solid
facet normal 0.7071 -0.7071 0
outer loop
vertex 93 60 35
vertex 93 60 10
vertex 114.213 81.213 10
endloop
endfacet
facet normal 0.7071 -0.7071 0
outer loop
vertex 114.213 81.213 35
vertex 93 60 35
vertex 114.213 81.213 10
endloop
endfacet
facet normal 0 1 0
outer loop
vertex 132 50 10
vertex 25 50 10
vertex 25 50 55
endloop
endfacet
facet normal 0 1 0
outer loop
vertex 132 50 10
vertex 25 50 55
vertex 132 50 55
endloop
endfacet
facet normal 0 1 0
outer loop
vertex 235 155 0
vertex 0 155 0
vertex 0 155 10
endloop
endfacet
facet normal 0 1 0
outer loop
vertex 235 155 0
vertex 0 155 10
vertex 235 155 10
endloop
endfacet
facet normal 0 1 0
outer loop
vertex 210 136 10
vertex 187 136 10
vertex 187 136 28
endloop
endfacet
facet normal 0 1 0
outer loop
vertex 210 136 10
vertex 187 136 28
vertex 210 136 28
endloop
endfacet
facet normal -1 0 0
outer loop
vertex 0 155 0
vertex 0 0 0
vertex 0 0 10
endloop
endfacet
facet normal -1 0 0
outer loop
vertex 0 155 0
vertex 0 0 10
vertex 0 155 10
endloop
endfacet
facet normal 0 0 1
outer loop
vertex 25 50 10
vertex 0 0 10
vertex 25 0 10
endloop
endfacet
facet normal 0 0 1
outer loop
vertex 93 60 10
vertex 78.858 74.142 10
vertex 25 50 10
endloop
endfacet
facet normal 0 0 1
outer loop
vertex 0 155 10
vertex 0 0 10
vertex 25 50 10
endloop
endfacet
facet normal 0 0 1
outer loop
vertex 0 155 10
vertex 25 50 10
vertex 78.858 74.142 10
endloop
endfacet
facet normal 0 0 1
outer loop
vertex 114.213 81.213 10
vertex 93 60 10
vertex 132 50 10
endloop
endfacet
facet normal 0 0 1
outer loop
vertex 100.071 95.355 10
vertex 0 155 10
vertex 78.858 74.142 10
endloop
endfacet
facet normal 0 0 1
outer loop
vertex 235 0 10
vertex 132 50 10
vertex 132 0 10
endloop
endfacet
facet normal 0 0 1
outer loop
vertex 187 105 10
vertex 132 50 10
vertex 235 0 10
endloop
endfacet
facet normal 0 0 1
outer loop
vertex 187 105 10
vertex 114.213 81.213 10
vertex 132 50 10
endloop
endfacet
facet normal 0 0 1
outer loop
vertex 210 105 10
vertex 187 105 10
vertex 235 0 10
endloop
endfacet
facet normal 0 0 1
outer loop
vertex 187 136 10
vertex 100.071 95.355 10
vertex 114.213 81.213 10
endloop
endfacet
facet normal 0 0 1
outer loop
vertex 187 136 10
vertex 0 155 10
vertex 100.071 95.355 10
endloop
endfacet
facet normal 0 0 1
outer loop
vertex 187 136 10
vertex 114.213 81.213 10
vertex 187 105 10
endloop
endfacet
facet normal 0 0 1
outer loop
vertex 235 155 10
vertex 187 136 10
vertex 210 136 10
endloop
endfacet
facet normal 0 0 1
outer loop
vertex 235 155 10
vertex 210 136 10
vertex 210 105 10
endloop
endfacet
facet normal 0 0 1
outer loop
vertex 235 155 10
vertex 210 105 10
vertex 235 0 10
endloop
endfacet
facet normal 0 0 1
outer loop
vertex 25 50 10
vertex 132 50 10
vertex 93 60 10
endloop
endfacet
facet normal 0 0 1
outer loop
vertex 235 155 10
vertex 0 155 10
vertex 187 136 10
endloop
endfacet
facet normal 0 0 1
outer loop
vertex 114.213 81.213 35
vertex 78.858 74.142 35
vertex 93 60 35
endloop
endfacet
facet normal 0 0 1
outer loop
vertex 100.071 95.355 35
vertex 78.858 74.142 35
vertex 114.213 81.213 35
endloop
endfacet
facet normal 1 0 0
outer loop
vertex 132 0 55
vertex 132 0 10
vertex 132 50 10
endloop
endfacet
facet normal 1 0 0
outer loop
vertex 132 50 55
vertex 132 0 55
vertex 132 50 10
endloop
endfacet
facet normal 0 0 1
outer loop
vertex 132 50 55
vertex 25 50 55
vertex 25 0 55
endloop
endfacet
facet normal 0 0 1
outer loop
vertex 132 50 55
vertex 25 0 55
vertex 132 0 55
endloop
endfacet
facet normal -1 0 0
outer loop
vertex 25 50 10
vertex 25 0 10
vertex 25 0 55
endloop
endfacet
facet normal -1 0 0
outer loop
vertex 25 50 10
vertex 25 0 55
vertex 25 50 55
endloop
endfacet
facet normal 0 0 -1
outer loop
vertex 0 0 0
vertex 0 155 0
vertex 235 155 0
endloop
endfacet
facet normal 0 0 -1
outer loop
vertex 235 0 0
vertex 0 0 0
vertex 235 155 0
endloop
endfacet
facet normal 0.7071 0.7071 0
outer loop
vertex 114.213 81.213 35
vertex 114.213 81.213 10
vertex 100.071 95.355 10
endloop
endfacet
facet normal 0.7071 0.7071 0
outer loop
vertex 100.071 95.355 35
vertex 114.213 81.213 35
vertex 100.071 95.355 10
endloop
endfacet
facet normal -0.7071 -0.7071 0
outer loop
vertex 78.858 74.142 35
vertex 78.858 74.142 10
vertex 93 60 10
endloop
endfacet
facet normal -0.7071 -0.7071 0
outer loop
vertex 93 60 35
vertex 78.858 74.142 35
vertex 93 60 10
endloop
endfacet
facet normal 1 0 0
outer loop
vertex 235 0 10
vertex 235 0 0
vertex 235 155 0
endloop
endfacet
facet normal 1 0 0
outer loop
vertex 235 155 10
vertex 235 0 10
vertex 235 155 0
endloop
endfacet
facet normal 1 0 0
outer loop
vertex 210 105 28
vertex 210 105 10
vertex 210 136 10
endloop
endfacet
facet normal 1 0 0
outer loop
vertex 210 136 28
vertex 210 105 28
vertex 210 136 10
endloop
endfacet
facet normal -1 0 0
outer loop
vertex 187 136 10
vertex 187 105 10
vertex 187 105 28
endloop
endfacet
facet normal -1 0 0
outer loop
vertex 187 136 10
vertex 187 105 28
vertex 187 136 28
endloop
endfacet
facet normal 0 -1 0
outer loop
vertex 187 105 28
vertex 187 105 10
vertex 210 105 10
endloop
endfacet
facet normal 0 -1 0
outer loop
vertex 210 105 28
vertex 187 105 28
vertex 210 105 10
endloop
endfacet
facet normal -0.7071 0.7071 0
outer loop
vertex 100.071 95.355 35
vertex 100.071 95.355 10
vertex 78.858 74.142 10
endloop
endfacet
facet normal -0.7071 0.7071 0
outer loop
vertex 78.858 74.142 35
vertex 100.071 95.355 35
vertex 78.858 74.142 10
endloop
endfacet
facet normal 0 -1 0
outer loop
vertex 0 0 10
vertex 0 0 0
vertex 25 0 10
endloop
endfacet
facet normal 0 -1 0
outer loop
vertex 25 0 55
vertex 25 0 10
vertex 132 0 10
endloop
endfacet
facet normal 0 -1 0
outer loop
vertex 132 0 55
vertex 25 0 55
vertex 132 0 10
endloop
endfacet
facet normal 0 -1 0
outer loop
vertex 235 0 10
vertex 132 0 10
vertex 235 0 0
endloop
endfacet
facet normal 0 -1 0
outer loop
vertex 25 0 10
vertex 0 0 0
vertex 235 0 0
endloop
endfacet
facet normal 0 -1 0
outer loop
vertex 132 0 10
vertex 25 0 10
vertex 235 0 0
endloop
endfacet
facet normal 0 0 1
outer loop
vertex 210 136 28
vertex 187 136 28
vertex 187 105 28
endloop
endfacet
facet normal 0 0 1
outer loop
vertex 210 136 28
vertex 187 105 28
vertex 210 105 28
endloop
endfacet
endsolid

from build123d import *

# Parameters (mm, degrees)
F0_W     = 235
F0_H     = 155
F1_DEPTH = 10
F2_W     = 107
F2_H     = 50
F3_DEPTH = 45
F4_W     = 23
F4_H     = 31
F5_DEPTH = 18
F7_DEPTH = 25


with BuildPart() as f1:
    # F0 (on Top) → F1 (new body)
    with BuildSketch(Plane.XY):
        with Locations((117.5, 77.5)):
            Rectangle(F0_W, F0_H)
    extrude(amount=F1_DEPTH)

    # F2 (on face) → F3 (join)
    with BuildSketch(Plane.XY.offset(10)):
        with Locations((78.5, 25)):
            Rectangle(F2_W, F2_H)
    extrude(amount=F3_DEPTH)

    # F4 (on face) → F5 (join)
    with BuildSketch(Plane.XY.offset(10)):
        with Locations((198.5, 120.5)):
            Rectangle(F4_W, F4_H)
    extrude(amount=F5_DEPTH)

    # F6 (on face) → F7 (join)
    with BuildSketch(Plane.XY.offset(10)):
        Polygon((100.071068, 95.355339), (78.857864, 74.142136), (93, 60), (114.213203, 81.213203), align=None)
    extrude(amount=F7_DEPTH)


solid = f1.part
